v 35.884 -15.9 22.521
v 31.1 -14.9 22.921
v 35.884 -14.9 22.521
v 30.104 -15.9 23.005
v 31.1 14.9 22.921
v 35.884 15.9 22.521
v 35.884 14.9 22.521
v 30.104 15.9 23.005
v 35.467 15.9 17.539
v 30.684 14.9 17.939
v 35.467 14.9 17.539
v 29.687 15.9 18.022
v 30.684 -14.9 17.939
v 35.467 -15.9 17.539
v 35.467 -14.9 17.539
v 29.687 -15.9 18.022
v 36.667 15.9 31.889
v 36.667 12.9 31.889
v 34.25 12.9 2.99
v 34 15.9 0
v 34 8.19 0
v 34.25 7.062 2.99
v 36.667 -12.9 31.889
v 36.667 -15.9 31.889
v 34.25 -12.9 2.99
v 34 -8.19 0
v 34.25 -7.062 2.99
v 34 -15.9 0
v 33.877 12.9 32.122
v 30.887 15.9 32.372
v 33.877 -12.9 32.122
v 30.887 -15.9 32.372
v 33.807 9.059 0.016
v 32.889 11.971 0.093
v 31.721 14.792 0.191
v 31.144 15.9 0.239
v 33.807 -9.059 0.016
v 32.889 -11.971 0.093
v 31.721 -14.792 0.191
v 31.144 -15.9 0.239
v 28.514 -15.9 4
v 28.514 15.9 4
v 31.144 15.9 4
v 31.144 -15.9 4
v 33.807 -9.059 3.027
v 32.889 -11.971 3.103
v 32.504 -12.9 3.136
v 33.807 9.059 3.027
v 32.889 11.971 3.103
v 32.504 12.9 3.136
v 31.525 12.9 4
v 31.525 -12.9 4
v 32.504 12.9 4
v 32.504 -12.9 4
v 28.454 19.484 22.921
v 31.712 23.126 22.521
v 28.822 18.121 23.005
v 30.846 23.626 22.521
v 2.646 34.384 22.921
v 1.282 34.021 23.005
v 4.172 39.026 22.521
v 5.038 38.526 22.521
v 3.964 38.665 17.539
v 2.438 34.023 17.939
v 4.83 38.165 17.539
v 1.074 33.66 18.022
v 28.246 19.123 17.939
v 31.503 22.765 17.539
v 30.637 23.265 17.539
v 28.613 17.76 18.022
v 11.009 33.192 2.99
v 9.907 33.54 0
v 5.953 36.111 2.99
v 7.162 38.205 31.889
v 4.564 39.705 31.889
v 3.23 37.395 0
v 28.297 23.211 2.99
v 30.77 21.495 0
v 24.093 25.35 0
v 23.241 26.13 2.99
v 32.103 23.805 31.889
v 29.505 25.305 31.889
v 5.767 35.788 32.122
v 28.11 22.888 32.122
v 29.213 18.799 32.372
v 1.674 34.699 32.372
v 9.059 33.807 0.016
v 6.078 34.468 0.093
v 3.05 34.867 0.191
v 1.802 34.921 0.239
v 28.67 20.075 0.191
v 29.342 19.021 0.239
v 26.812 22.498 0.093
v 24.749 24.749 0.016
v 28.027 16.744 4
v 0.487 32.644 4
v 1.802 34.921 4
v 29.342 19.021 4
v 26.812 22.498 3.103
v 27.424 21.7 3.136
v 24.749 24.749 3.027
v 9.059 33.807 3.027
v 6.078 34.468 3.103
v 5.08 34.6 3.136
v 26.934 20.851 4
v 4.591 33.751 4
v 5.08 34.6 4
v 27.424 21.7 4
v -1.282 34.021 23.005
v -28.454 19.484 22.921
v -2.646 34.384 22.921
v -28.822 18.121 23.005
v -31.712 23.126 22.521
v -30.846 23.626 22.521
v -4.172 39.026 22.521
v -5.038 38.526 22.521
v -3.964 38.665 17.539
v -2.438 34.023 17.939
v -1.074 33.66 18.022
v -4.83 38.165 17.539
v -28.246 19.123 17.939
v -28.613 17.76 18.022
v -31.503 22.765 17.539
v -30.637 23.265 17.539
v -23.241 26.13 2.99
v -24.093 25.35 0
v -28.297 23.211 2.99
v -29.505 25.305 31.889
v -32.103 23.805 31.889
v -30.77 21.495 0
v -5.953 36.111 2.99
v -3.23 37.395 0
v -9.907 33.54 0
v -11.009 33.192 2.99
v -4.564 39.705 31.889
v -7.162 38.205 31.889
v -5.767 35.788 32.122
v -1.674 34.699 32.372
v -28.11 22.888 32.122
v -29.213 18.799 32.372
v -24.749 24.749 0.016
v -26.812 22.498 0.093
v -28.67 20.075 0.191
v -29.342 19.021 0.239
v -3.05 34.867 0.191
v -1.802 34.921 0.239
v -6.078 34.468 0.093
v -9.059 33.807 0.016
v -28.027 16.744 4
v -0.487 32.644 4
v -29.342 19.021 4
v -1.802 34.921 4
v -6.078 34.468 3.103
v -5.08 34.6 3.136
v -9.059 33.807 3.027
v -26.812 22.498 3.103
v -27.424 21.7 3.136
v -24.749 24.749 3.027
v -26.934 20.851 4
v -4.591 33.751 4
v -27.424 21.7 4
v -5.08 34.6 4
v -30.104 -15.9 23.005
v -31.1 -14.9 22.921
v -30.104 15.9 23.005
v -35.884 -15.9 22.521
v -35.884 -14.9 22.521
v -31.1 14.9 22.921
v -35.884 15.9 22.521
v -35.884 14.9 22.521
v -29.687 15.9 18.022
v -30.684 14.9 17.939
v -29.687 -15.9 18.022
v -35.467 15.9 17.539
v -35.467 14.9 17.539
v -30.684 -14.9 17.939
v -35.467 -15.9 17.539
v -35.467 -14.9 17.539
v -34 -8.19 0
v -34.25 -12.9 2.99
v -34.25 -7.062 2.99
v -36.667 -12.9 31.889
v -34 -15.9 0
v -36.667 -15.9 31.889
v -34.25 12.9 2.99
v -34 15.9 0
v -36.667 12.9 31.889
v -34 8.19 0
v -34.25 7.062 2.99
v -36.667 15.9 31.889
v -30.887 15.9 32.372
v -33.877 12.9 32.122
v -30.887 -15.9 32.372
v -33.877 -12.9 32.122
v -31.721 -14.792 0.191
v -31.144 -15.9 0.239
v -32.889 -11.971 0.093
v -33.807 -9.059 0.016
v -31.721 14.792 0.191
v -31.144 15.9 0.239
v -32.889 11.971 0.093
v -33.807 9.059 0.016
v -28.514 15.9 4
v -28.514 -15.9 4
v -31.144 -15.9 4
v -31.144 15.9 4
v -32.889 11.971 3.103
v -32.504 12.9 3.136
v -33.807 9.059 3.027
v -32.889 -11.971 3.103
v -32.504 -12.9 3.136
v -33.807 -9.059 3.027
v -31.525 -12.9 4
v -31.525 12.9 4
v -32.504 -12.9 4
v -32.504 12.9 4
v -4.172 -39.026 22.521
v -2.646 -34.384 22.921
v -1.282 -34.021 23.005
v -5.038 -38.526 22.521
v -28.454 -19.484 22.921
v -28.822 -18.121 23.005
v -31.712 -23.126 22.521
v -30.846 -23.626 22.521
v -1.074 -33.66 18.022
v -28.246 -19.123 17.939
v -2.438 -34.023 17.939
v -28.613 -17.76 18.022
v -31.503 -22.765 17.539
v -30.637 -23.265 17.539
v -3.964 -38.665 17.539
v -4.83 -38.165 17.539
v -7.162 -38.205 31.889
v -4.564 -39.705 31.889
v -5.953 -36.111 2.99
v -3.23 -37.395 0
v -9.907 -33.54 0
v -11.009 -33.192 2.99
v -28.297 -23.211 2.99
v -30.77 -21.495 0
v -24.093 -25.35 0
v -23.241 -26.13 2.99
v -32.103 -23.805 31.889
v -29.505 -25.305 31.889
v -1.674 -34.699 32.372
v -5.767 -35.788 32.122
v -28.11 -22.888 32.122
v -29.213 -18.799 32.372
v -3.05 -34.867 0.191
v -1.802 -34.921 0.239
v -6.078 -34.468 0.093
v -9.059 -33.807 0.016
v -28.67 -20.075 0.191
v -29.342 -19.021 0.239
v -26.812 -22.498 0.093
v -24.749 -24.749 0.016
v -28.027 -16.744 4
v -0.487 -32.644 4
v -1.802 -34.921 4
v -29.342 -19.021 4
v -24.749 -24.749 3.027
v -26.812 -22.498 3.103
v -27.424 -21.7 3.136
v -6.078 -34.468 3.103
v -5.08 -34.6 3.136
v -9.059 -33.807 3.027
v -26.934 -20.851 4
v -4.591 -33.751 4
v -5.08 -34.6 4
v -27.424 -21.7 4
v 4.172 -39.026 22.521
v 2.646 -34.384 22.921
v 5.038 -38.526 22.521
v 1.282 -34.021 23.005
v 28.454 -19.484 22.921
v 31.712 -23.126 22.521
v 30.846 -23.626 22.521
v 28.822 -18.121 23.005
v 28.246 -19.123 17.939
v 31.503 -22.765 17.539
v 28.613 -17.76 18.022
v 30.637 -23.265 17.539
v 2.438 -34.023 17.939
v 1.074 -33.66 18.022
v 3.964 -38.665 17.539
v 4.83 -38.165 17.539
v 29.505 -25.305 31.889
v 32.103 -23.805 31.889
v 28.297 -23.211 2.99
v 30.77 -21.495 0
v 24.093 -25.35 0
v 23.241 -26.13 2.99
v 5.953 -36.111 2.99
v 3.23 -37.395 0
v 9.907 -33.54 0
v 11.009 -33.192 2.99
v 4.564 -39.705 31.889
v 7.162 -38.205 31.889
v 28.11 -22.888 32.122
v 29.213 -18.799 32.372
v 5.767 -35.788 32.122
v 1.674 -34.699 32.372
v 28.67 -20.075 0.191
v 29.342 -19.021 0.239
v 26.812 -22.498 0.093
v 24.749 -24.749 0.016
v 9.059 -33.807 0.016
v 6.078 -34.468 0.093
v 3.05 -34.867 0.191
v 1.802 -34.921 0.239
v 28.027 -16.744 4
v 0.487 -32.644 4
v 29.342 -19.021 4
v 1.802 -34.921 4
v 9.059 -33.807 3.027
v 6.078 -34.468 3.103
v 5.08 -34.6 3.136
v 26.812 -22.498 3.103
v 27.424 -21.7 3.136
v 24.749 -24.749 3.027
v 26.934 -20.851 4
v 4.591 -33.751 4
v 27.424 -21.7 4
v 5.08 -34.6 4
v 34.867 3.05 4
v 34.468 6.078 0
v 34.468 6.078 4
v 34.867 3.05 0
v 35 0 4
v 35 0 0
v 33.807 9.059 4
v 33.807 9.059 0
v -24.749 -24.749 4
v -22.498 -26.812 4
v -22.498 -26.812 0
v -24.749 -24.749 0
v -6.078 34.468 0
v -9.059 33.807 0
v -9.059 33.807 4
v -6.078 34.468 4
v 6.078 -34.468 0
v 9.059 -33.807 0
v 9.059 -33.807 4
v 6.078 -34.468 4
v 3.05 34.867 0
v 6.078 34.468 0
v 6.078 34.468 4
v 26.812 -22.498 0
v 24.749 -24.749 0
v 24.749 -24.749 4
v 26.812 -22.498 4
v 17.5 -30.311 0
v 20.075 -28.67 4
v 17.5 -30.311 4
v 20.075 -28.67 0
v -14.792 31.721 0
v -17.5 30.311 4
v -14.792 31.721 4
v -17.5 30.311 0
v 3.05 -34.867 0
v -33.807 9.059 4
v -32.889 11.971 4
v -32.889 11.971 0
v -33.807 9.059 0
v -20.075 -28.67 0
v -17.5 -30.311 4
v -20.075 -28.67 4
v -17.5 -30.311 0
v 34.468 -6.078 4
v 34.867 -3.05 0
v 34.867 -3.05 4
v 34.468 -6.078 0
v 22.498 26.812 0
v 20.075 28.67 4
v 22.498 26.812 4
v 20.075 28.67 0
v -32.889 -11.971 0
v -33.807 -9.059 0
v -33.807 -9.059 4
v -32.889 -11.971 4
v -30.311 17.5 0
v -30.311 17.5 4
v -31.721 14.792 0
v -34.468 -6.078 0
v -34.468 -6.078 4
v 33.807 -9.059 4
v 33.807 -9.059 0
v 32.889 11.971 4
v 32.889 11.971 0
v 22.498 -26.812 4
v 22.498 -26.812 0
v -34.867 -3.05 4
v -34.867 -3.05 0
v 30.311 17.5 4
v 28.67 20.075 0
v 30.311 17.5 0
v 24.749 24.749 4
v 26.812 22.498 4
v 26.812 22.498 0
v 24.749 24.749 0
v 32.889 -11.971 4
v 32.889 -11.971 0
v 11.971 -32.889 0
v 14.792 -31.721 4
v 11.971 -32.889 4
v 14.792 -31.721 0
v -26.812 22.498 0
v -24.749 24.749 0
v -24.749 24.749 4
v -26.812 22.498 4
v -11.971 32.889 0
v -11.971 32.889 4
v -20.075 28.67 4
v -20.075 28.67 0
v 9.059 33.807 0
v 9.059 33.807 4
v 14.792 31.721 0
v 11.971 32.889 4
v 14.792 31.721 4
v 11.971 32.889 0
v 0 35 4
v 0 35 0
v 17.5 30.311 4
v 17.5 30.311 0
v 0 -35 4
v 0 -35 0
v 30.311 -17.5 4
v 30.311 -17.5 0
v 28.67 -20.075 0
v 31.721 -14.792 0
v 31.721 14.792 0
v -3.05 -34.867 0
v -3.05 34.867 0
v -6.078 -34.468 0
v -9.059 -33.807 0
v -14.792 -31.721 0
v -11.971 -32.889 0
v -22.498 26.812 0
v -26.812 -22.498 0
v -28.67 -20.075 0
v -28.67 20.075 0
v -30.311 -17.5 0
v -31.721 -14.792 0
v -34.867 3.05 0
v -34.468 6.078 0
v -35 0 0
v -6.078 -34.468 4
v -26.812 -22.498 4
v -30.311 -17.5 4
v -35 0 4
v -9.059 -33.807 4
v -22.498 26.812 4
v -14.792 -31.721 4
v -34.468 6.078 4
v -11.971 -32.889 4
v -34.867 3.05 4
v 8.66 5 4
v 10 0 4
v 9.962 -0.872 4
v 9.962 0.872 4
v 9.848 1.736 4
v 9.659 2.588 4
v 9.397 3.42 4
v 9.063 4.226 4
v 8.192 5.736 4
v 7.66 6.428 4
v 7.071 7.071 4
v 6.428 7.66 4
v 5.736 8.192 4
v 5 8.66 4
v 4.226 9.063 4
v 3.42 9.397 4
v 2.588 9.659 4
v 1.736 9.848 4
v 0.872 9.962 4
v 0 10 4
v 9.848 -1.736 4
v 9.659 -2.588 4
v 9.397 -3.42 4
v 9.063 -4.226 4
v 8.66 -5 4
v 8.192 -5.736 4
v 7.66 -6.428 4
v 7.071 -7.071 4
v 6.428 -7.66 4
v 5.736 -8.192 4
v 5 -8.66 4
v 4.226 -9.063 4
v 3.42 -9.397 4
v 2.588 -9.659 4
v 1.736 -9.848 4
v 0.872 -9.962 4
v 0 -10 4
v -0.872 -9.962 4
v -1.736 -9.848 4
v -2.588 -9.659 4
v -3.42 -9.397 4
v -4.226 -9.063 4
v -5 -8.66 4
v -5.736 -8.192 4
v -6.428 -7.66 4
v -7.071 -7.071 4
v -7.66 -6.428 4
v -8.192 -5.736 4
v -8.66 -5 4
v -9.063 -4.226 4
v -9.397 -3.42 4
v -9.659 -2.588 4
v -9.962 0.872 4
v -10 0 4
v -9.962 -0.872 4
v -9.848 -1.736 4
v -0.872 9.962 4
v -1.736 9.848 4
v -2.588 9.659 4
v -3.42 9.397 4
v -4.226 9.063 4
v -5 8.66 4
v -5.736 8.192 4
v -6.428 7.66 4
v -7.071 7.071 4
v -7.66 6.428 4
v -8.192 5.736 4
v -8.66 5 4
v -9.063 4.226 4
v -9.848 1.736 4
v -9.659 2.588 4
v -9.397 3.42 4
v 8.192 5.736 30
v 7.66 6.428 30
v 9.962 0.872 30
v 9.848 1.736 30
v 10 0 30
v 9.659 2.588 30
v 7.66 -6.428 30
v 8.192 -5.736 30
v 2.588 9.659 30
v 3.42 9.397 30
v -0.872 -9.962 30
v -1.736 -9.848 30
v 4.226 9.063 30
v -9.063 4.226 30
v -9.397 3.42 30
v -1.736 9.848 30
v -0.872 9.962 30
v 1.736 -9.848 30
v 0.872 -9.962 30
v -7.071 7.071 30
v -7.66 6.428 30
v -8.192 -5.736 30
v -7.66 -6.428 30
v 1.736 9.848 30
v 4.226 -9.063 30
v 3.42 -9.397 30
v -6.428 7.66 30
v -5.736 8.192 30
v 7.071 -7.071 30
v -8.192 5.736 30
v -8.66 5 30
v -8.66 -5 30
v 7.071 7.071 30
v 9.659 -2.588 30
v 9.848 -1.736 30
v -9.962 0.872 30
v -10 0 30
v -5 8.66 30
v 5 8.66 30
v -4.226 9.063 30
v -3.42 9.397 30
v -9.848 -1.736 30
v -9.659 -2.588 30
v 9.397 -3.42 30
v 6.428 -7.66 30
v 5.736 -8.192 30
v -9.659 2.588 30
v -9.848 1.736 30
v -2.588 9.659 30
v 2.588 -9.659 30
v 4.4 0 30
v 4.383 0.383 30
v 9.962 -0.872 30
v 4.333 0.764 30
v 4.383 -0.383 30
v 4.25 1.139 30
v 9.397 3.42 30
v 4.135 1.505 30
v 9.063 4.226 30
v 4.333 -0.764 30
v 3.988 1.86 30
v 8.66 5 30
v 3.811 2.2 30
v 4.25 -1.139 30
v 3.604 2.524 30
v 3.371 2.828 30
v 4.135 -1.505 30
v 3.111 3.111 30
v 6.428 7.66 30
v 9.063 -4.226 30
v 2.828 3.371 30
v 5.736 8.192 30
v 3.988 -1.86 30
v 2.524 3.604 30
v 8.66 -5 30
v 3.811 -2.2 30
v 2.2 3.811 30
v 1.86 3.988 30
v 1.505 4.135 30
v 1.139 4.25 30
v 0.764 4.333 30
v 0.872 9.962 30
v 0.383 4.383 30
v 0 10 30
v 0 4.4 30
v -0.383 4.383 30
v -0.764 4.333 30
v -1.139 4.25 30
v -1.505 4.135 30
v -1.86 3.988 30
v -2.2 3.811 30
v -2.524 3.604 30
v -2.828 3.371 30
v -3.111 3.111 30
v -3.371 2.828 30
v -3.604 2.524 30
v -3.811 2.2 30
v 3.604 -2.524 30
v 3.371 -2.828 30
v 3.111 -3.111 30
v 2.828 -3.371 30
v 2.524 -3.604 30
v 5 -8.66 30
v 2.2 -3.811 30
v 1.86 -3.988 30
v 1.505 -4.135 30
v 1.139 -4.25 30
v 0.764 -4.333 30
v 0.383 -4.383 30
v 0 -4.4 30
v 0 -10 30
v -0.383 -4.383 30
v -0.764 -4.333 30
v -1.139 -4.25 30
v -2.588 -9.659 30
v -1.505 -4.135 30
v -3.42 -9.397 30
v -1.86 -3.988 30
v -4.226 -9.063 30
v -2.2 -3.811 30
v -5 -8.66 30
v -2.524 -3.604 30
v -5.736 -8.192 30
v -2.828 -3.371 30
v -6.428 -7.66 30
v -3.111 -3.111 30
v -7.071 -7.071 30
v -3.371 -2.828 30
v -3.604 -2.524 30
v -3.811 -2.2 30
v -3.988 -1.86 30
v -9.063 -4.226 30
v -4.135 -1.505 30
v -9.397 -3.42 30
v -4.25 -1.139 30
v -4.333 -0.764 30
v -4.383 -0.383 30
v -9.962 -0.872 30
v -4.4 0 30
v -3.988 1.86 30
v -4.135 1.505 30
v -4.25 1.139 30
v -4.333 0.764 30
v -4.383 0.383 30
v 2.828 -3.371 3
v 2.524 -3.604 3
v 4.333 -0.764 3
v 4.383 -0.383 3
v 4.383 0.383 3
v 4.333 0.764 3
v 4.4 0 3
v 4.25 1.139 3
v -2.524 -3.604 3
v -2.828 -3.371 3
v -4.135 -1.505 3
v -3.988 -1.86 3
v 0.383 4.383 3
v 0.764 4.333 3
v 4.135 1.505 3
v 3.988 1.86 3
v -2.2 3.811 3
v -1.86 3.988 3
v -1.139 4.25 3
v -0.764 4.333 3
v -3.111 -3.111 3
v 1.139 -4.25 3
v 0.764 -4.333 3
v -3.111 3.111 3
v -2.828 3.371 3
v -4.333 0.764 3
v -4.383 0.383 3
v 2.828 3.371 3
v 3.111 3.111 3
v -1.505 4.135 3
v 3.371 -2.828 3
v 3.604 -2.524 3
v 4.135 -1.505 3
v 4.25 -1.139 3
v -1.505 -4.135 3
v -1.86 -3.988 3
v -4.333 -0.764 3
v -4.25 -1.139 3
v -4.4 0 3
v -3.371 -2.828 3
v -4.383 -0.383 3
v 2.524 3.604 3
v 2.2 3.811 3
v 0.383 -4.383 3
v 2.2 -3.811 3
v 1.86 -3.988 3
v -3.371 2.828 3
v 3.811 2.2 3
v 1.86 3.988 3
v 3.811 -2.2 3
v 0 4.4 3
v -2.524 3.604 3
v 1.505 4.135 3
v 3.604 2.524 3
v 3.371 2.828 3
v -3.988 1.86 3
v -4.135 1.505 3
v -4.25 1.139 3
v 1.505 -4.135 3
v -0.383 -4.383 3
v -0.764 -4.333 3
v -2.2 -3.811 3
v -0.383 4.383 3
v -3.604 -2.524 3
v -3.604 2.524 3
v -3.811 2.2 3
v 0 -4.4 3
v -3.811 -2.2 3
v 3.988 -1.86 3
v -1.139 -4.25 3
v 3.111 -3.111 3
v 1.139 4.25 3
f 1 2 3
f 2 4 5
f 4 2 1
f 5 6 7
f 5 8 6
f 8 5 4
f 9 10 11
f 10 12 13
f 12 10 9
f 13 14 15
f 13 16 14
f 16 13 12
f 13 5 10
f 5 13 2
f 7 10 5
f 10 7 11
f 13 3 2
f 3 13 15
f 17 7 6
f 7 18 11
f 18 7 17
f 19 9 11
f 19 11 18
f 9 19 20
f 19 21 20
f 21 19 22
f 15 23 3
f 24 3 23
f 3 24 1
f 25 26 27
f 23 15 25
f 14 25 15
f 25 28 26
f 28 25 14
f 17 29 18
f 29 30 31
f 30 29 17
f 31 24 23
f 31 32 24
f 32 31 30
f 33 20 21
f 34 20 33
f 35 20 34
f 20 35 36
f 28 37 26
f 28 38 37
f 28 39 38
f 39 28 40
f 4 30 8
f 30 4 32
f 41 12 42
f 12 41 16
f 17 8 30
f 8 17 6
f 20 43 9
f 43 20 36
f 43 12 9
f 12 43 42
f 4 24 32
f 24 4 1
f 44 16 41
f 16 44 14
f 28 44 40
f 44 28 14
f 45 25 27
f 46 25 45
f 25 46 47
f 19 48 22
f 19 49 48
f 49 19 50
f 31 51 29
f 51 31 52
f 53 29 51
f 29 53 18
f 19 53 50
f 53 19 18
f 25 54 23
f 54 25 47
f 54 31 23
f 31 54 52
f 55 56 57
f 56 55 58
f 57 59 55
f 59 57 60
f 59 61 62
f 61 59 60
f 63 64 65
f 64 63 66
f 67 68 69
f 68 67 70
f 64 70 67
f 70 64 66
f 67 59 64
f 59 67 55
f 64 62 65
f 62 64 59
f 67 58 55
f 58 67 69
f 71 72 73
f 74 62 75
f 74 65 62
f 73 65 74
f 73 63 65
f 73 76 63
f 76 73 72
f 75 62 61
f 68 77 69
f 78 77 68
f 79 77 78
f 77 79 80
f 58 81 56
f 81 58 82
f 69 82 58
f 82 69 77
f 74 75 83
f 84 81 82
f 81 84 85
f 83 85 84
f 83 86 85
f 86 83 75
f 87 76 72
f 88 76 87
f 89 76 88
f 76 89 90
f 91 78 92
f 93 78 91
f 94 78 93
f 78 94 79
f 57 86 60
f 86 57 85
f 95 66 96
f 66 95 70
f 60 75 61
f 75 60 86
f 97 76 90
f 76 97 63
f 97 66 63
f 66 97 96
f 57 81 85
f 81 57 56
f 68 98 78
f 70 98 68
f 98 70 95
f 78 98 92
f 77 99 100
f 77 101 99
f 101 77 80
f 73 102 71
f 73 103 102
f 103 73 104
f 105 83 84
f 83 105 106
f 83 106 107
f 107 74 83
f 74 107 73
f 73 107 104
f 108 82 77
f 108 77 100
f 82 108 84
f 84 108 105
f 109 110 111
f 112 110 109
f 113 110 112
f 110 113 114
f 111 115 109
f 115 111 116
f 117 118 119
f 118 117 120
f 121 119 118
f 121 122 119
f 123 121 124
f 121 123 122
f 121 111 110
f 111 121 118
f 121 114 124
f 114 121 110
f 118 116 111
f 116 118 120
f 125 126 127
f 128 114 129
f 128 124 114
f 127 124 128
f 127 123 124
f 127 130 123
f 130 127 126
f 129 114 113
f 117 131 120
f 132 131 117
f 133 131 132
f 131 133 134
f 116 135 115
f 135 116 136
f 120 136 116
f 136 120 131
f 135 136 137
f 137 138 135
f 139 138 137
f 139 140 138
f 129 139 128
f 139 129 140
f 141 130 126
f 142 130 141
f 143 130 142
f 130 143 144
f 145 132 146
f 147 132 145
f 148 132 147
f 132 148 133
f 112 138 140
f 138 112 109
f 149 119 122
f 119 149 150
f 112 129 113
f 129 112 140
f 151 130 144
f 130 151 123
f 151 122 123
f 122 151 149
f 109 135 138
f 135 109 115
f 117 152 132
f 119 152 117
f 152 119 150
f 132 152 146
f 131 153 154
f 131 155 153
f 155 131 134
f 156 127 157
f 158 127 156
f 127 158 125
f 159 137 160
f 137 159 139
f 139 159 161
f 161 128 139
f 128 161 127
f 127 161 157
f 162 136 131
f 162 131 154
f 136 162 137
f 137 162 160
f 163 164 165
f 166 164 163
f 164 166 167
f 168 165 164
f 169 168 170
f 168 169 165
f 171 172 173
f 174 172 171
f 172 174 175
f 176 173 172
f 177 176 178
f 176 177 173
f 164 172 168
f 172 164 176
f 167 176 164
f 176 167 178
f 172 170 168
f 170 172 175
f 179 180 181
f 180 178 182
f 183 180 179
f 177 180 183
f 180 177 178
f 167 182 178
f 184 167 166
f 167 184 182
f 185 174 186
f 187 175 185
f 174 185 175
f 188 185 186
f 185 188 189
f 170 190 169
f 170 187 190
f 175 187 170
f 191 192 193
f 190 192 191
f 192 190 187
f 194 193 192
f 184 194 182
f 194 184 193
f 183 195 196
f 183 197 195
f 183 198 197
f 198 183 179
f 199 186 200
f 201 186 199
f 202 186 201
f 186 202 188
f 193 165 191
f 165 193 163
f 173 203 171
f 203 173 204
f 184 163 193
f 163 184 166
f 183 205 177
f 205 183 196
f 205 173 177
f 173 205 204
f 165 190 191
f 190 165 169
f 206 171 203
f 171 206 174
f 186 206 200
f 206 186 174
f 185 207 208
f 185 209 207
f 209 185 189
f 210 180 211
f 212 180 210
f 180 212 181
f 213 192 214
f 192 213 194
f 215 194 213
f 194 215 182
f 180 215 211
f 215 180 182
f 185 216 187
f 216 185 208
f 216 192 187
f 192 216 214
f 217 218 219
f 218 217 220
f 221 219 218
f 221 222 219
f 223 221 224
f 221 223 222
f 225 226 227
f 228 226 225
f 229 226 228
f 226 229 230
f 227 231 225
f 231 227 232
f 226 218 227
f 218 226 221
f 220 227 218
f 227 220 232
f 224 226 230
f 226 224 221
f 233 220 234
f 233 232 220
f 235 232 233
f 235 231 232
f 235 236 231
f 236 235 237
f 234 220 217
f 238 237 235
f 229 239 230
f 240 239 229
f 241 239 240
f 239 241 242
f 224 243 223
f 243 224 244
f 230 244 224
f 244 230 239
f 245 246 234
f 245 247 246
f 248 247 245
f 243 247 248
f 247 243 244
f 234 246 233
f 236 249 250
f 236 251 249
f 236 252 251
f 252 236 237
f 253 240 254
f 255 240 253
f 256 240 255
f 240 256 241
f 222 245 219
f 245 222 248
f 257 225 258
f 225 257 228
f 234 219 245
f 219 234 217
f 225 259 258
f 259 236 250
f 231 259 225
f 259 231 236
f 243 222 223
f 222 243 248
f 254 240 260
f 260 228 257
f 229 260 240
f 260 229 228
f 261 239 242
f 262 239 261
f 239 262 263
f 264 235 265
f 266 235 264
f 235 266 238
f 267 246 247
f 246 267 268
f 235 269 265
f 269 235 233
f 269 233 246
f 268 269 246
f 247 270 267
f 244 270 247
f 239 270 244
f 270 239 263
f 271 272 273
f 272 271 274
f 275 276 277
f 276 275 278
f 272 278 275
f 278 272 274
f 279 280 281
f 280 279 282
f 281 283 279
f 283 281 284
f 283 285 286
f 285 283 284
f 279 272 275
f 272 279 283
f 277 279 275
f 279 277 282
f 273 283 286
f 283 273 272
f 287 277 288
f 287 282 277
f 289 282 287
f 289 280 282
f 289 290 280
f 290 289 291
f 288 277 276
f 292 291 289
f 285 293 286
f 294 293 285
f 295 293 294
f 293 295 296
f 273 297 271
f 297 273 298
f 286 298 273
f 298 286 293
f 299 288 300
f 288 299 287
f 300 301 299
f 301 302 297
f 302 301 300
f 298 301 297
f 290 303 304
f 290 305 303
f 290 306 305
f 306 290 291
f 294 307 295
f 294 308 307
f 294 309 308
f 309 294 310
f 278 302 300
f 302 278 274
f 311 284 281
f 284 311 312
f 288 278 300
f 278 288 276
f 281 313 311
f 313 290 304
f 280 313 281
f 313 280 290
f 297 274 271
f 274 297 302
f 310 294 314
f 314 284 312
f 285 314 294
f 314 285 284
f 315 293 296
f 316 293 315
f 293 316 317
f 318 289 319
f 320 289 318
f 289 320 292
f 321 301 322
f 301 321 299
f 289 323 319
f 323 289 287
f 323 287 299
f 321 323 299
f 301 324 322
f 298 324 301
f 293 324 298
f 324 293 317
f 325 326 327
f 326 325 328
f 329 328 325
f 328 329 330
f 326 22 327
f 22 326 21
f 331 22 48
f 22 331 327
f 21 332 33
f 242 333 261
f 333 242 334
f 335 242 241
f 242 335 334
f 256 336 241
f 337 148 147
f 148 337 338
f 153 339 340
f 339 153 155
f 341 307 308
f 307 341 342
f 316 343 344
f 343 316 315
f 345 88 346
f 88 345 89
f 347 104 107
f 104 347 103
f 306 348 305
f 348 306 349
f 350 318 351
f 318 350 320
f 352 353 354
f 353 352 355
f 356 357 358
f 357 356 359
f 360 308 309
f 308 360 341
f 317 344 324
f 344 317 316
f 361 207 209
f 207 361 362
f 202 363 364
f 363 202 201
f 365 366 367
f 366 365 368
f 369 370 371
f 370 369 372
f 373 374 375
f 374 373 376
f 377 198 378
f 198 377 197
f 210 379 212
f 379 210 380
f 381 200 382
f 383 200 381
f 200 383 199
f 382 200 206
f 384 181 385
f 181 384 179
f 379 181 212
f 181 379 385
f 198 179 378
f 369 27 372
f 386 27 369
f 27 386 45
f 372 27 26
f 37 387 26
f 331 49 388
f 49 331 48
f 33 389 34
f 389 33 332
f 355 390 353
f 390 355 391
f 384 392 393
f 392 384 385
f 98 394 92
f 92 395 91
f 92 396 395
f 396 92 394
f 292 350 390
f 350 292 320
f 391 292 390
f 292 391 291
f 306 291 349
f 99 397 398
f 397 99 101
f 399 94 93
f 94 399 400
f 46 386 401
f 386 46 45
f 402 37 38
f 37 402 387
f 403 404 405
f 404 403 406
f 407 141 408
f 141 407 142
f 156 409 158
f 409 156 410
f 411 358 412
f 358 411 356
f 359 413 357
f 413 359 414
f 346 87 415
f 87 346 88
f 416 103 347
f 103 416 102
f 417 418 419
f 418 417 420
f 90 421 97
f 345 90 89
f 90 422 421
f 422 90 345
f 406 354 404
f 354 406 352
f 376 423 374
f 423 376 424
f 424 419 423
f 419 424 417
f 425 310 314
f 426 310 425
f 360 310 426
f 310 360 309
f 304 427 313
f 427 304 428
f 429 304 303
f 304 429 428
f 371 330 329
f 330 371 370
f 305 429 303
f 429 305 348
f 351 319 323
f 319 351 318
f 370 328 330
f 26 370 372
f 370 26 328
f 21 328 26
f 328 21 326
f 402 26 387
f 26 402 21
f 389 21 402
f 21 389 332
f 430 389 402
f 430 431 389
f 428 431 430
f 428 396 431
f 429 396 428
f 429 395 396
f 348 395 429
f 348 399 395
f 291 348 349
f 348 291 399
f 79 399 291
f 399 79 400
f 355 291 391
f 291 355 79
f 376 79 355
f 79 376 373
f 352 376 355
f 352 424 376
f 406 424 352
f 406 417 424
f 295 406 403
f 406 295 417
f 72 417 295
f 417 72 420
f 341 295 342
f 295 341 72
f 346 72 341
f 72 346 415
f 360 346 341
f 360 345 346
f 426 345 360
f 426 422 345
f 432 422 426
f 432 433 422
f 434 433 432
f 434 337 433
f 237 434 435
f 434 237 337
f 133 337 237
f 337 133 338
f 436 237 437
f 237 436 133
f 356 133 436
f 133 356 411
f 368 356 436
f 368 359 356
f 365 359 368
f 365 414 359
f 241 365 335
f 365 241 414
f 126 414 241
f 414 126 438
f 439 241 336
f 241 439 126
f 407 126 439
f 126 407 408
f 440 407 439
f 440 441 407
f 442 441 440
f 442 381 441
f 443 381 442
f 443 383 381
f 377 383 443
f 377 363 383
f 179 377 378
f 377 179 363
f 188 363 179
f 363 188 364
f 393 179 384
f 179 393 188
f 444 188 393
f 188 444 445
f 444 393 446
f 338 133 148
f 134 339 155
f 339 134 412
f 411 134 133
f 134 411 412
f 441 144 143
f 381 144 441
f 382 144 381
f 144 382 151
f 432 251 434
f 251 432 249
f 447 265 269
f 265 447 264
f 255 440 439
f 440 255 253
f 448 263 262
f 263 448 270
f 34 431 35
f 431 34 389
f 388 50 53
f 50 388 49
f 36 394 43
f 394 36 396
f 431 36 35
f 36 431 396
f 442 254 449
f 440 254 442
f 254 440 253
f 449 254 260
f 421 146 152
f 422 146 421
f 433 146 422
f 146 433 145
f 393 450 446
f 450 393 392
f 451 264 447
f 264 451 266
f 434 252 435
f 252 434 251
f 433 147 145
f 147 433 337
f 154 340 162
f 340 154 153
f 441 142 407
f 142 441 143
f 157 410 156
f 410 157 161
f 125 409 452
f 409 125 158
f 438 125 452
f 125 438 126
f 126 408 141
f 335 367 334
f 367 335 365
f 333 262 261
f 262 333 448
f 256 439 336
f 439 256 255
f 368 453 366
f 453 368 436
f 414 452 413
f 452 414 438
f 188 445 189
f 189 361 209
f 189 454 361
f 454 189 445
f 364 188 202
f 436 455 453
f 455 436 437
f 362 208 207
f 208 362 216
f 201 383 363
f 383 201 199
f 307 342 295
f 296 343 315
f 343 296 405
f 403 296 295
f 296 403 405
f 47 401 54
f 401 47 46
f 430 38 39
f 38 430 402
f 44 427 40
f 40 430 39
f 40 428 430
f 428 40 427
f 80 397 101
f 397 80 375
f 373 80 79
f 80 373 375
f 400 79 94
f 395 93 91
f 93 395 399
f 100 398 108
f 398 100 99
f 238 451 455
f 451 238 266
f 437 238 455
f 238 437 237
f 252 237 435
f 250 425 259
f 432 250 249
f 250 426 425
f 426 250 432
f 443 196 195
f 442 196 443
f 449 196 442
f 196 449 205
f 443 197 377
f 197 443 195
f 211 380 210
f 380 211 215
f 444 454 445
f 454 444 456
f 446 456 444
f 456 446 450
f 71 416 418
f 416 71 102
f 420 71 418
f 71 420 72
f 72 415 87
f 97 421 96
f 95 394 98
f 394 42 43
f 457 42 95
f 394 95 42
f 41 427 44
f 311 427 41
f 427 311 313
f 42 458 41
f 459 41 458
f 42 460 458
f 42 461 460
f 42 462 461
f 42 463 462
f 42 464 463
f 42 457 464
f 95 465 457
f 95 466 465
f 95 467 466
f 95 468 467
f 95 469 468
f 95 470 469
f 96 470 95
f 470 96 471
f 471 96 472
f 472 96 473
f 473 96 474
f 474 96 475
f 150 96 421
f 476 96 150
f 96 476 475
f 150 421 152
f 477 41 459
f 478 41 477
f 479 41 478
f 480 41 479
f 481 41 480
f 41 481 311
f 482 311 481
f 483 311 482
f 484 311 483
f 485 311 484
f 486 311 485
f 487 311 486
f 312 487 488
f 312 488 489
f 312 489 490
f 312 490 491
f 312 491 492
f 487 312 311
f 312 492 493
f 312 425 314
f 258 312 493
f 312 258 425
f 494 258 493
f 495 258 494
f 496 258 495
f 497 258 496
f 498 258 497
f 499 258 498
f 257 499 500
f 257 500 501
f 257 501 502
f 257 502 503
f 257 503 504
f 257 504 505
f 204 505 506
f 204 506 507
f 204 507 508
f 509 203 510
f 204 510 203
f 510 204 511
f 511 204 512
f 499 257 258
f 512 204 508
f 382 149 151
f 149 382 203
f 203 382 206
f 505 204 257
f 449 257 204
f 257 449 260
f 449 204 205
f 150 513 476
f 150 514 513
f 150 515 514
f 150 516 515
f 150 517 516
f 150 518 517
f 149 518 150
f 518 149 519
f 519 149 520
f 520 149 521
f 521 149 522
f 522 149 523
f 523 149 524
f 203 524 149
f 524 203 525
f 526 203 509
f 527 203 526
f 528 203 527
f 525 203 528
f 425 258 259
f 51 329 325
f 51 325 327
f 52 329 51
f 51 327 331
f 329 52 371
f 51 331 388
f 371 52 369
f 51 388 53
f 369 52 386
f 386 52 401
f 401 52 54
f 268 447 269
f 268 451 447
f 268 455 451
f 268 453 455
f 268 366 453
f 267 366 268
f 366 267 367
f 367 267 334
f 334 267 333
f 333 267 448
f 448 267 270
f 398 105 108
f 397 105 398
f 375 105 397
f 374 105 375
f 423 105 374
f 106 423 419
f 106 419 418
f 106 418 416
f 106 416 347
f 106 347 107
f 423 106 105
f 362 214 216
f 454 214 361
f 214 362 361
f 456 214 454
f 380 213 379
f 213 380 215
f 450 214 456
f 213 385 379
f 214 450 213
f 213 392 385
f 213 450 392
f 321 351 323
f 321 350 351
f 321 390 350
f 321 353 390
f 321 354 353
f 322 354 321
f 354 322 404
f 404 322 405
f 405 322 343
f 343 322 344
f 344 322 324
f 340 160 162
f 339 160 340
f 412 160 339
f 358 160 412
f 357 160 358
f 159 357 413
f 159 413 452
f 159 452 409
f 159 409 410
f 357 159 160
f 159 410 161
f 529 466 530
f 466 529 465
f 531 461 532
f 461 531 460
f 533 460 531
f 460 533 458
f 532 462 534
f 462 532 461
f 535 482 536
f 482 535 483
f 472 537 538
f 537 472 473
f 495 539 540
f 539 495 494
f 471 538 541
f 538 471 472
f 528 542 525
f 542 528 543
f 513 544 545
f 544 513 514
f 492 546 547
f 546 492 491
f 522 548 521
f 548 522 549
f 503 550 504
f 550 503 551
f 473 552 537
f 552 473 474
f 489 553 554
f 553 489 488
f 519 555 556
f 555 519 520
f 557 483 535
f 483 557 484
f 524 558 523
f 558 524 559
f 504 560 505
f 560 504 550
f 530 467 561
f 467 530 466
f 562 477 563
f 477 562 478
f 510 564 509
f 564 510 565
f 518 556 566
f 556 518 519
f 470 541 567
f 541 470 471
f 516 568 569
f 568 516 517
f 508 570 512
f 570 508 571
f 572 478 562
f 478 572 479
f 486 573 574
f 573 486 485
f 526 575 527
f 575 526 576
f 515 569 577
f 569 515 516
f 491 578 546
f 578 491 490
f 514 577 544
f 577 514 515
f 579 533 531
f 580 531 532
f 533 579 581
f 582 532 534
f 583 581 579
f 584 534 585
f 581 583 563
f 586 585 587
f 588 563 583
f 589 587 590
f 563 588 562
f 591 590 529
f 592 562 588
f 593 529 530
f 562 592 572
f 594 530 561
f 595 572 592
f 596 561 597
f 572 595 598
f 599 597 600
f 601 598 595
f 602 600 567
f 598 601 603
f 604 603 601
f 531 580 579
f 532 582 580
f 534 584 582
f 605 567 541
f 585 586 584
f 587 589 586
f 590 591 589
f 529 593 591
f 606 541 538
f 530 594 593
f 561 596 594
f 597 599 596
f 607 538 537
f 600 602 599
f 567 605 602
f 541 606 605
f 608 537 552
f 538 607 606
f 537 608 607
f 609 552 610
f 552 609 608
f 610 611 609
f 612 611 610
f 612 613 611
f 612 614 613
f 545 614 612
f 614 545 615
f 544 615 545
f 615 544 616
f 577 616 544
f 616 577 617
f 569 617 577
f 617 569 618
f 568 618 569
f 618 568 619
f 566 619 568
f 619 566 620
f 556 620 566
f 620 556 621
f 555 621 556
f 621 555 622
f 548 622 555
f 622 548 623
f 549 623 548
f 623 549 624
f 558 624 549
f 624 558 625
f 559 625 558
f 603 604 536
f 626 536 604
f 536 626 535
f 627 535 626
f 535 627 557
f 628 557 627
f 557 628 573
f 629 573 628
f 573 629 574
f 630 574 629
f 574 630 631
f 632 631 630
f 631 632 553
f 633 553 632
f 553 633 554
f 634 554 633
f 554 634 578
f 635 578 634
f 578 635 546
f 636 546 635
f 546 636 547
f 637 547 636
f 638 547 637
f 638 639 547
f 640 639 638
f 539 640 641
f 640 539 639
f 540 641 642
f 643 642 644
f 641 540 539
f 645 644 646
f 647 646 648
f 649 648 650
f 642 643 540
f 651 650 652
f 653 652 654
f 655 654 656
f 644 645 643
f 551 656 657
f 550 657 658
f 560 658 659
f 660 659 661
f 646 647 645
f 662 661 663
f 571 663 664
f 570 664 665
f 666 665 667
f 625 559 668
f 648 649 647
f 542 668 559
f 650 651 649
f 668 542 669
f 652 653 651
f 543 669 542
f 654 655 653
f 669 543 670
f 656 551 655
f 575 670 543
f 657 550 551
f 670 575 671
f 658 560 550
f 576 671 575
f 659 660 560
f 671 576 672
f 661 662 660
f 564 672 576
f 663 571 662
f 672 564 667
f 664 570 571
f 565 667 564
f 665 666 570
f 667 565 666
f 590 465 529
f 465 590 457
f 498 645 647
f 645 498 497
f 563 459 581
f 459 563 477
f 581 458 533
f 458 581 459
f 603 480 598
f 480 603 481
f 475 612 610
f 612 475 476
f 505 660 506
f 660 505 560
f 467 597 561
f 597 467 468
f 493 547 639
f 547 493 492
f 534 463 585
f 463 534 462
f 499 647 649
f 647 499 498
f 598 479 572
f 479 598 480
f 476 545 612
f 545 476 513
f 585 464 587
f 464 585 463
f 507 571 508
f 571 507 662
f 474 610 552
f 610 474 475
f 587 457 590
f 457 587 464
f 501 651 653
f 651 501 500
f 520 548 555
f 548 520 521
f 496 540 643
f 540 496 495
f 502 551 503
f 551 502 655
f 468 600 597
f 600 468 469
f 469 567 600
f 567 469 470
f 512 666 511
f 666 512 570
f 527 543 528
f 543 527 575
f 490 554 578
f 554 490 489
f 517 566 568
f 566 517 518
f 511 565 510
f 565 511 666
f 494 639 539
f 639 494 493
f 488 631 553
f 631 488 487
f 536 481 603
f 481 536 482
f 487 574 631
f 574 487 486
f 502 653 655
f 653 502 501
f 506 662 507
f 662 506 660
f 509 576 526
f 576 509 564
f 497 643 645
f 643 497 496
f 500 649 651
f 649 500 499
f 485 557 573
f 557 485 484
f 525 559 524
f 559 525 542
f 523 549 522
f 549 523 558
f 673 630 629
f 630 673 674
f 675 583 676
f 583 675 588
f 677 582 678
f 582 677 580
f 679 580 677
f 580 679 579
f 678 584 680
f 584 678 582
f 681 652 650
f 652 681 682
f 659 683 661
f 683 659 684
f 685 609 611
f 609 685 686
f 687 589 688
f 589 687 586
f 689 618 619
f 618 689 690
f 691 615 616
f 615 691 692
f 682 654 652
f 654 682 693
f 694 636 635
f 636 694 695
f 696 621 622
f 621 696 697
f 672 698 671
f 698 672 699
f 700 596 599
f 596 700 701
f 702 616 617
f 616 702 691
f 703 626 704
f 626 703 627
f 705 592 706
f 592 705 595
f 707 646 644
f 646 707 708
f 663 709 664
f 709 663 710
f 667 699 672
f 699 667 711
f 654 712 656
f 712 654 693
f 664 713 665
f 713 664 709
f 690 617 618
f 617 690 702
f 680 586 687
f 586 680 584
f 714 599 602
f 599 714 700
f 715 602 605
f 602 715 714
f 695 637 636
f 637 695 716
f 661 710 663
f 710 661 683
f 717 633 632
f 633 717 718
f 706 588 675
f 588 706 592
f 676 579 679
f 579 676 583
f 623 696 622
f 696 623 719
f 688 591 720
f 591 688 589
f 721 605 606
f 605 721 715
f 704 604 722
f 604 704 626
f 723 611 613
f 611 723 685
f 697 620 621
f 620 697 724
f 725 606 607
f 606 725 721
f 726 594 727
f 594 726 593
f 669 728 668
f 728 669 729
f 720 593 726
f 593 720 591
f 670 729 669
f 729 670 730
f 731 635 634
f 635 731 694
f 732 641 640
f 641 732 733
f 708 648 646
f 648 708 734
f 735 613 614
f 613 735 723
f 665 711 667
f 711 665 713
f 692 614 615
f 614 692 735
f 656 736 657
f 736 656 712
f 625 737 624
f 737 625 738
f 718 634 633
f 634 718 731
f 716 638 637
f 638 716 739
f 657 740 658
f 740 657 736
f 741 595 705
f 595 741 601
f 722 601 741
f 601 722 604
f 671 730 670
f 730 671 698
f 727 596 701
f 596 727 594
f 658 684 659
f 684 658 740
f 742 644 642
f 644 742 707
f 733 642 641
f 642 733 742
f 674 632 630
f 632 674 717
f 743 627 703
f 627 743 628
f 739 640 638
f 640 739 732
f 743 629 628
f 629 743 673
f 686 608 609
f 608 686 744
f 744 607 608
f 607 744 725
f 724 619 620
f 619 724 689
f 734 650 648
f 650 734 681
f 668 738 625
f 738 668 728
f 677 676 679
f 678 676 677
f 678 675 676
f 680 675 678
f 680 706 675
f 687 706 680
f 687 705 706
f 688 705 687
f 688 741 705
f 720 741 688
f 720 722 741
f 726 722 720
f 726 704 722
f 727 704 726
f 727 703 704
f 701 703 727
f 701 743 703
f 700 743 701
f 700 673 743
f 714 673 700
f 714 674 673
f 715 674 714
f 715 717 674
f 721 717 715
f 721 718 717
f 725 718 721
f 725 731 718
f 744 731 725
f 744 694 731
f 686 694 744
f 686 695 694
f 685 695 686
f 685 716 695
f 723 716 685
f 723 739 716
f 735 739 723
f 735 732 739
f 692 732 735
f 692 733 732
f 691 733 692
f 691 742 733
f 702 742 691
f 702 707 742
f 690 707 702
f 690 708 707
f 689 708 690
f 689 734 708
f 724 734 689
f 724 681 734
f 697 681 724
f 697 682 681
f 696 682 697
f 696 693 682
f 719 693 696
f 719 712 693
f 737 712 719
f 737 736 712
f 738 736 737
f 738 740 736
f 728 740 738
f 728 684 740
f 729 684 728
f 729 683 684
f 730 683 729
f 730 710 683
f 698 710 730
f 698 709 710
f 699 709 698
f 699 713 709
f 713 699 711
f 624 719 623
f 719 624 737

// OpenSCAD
// file: lib.scad
// Shared pieces for the Winterlight PETG parts (Bambu Lab A1, 256 × 256 × 256 mm).
// Millimetres. Measure your own mounting strip and set strip_w / strip_t on the
// command line (-D strip_w=20) or in OpenSCAD's Customizer before printing.
$fn = 72;
strip_w = 25;   // pixel mounting strip width
strip_t = 2;    // pixel mounting strip thickness
clr = 0.4;      // clearance per side, a snug slide fit in PETG
wall = 3;       // channel walls
tie_d = 4.5;    // holes for the 2.5 mm cable ties or an M4 bolt

slot_t = strip_t + 2*clr;
slot_w = strip_w + 2*clr;
// Outside size of a strip channel: radial depth and tangential width.
ch_depth = slot_t + wall;
ch_width = slot_w + 2*wall;

// A channel that holds a strip's end: the strip runs up +Z with its face
// (and its pixels) towards +X. Open on the +X side so the strip drops in,
// with a groove round the outside where a cable tie pulls it home.
module channel(h, floor = 3) {
  z0 = h*0.55;
  difference() {
    translate([-ch_depth, -ch_width/2, 0]) cube([ch_depth, ch_width, h]);
    translate([-slot_t, -slot_w/2, floor]) cube([slot_t + 1, slot_w, h]);
    // Tie groove, 1 mm deep, round the back and both sides.
    difference() {
      translate([-ch_depth - 1, -ch_width/2 - 1, z0]) cube([ch_depth + 2, ch_width + 2, 5]);
      translate([-ch_depth + 1, -ch_width/2 + 1, z0 - 1]) cube([ch_depth + 2, ch_width - 2, 7]);
    }
  }
}

// n channels on a circle of radius r (the strip's face), leaning by tilt
// degrees: positive leans the top inwards, negative outwards.
module channel_ring(n, r, tilt, h, start = 0) {
  intersection() {
    for (i = [0 : n - 1]) rotate([0, 0, start + 360*i/n])
      translate([r, 0, 0]) rotate([0, -tilt, 0]) channel(h);
    translate([-1000, -1000, 0]) cube([2000, 2000, 1000]);
  }
}

// A flat ring with spokes to a centre boss: the plate that ties the channels together.
module spoked_ring(r_out, r_in, t, n, boss_d, arm_w = 8) {
  difference() { cylinder(r = r_out, h = t); translate([0, 0, -1]) cylinder(r = r_in, h = t + 2); }
  for (i = [0 : n - 1]) rotate([0, 0, 360*i/n + 180/n]) translate([0, -arm_w/2, 0]) cube([r_in + 1, arm_w, t]);
  cylinder(d = boss_d, h = t);
}
// main file
// Mini tree, top cap. Printed upside down: the flat top on the plate and the
// six channels pointing up (down in use, where the spokes come in from below).
// The centre hole takes the top of the 8 mm rod. No supports.
include <lib.scad>
spokes = 6;
r_base = 80;
r_top = 34;
height = 550;
rod_d = 8;
ch_h = 32;
tilt = atan((r_base - r_top)/height);
plate = 4;

difference() {
  union() {
    cylinder(r = r_top + 1, h = plate);
    cylinder(d = rod_d + 12, h = 30);
    // In print the channels lean outwards: in use they lean in towards the tip.
    channel_ring(spokes, r_top, -tilt, ch_h);
  }
  translate([0, 0, 3]) cylinder(d = rod_d + 2*clr, h = 30);
}
